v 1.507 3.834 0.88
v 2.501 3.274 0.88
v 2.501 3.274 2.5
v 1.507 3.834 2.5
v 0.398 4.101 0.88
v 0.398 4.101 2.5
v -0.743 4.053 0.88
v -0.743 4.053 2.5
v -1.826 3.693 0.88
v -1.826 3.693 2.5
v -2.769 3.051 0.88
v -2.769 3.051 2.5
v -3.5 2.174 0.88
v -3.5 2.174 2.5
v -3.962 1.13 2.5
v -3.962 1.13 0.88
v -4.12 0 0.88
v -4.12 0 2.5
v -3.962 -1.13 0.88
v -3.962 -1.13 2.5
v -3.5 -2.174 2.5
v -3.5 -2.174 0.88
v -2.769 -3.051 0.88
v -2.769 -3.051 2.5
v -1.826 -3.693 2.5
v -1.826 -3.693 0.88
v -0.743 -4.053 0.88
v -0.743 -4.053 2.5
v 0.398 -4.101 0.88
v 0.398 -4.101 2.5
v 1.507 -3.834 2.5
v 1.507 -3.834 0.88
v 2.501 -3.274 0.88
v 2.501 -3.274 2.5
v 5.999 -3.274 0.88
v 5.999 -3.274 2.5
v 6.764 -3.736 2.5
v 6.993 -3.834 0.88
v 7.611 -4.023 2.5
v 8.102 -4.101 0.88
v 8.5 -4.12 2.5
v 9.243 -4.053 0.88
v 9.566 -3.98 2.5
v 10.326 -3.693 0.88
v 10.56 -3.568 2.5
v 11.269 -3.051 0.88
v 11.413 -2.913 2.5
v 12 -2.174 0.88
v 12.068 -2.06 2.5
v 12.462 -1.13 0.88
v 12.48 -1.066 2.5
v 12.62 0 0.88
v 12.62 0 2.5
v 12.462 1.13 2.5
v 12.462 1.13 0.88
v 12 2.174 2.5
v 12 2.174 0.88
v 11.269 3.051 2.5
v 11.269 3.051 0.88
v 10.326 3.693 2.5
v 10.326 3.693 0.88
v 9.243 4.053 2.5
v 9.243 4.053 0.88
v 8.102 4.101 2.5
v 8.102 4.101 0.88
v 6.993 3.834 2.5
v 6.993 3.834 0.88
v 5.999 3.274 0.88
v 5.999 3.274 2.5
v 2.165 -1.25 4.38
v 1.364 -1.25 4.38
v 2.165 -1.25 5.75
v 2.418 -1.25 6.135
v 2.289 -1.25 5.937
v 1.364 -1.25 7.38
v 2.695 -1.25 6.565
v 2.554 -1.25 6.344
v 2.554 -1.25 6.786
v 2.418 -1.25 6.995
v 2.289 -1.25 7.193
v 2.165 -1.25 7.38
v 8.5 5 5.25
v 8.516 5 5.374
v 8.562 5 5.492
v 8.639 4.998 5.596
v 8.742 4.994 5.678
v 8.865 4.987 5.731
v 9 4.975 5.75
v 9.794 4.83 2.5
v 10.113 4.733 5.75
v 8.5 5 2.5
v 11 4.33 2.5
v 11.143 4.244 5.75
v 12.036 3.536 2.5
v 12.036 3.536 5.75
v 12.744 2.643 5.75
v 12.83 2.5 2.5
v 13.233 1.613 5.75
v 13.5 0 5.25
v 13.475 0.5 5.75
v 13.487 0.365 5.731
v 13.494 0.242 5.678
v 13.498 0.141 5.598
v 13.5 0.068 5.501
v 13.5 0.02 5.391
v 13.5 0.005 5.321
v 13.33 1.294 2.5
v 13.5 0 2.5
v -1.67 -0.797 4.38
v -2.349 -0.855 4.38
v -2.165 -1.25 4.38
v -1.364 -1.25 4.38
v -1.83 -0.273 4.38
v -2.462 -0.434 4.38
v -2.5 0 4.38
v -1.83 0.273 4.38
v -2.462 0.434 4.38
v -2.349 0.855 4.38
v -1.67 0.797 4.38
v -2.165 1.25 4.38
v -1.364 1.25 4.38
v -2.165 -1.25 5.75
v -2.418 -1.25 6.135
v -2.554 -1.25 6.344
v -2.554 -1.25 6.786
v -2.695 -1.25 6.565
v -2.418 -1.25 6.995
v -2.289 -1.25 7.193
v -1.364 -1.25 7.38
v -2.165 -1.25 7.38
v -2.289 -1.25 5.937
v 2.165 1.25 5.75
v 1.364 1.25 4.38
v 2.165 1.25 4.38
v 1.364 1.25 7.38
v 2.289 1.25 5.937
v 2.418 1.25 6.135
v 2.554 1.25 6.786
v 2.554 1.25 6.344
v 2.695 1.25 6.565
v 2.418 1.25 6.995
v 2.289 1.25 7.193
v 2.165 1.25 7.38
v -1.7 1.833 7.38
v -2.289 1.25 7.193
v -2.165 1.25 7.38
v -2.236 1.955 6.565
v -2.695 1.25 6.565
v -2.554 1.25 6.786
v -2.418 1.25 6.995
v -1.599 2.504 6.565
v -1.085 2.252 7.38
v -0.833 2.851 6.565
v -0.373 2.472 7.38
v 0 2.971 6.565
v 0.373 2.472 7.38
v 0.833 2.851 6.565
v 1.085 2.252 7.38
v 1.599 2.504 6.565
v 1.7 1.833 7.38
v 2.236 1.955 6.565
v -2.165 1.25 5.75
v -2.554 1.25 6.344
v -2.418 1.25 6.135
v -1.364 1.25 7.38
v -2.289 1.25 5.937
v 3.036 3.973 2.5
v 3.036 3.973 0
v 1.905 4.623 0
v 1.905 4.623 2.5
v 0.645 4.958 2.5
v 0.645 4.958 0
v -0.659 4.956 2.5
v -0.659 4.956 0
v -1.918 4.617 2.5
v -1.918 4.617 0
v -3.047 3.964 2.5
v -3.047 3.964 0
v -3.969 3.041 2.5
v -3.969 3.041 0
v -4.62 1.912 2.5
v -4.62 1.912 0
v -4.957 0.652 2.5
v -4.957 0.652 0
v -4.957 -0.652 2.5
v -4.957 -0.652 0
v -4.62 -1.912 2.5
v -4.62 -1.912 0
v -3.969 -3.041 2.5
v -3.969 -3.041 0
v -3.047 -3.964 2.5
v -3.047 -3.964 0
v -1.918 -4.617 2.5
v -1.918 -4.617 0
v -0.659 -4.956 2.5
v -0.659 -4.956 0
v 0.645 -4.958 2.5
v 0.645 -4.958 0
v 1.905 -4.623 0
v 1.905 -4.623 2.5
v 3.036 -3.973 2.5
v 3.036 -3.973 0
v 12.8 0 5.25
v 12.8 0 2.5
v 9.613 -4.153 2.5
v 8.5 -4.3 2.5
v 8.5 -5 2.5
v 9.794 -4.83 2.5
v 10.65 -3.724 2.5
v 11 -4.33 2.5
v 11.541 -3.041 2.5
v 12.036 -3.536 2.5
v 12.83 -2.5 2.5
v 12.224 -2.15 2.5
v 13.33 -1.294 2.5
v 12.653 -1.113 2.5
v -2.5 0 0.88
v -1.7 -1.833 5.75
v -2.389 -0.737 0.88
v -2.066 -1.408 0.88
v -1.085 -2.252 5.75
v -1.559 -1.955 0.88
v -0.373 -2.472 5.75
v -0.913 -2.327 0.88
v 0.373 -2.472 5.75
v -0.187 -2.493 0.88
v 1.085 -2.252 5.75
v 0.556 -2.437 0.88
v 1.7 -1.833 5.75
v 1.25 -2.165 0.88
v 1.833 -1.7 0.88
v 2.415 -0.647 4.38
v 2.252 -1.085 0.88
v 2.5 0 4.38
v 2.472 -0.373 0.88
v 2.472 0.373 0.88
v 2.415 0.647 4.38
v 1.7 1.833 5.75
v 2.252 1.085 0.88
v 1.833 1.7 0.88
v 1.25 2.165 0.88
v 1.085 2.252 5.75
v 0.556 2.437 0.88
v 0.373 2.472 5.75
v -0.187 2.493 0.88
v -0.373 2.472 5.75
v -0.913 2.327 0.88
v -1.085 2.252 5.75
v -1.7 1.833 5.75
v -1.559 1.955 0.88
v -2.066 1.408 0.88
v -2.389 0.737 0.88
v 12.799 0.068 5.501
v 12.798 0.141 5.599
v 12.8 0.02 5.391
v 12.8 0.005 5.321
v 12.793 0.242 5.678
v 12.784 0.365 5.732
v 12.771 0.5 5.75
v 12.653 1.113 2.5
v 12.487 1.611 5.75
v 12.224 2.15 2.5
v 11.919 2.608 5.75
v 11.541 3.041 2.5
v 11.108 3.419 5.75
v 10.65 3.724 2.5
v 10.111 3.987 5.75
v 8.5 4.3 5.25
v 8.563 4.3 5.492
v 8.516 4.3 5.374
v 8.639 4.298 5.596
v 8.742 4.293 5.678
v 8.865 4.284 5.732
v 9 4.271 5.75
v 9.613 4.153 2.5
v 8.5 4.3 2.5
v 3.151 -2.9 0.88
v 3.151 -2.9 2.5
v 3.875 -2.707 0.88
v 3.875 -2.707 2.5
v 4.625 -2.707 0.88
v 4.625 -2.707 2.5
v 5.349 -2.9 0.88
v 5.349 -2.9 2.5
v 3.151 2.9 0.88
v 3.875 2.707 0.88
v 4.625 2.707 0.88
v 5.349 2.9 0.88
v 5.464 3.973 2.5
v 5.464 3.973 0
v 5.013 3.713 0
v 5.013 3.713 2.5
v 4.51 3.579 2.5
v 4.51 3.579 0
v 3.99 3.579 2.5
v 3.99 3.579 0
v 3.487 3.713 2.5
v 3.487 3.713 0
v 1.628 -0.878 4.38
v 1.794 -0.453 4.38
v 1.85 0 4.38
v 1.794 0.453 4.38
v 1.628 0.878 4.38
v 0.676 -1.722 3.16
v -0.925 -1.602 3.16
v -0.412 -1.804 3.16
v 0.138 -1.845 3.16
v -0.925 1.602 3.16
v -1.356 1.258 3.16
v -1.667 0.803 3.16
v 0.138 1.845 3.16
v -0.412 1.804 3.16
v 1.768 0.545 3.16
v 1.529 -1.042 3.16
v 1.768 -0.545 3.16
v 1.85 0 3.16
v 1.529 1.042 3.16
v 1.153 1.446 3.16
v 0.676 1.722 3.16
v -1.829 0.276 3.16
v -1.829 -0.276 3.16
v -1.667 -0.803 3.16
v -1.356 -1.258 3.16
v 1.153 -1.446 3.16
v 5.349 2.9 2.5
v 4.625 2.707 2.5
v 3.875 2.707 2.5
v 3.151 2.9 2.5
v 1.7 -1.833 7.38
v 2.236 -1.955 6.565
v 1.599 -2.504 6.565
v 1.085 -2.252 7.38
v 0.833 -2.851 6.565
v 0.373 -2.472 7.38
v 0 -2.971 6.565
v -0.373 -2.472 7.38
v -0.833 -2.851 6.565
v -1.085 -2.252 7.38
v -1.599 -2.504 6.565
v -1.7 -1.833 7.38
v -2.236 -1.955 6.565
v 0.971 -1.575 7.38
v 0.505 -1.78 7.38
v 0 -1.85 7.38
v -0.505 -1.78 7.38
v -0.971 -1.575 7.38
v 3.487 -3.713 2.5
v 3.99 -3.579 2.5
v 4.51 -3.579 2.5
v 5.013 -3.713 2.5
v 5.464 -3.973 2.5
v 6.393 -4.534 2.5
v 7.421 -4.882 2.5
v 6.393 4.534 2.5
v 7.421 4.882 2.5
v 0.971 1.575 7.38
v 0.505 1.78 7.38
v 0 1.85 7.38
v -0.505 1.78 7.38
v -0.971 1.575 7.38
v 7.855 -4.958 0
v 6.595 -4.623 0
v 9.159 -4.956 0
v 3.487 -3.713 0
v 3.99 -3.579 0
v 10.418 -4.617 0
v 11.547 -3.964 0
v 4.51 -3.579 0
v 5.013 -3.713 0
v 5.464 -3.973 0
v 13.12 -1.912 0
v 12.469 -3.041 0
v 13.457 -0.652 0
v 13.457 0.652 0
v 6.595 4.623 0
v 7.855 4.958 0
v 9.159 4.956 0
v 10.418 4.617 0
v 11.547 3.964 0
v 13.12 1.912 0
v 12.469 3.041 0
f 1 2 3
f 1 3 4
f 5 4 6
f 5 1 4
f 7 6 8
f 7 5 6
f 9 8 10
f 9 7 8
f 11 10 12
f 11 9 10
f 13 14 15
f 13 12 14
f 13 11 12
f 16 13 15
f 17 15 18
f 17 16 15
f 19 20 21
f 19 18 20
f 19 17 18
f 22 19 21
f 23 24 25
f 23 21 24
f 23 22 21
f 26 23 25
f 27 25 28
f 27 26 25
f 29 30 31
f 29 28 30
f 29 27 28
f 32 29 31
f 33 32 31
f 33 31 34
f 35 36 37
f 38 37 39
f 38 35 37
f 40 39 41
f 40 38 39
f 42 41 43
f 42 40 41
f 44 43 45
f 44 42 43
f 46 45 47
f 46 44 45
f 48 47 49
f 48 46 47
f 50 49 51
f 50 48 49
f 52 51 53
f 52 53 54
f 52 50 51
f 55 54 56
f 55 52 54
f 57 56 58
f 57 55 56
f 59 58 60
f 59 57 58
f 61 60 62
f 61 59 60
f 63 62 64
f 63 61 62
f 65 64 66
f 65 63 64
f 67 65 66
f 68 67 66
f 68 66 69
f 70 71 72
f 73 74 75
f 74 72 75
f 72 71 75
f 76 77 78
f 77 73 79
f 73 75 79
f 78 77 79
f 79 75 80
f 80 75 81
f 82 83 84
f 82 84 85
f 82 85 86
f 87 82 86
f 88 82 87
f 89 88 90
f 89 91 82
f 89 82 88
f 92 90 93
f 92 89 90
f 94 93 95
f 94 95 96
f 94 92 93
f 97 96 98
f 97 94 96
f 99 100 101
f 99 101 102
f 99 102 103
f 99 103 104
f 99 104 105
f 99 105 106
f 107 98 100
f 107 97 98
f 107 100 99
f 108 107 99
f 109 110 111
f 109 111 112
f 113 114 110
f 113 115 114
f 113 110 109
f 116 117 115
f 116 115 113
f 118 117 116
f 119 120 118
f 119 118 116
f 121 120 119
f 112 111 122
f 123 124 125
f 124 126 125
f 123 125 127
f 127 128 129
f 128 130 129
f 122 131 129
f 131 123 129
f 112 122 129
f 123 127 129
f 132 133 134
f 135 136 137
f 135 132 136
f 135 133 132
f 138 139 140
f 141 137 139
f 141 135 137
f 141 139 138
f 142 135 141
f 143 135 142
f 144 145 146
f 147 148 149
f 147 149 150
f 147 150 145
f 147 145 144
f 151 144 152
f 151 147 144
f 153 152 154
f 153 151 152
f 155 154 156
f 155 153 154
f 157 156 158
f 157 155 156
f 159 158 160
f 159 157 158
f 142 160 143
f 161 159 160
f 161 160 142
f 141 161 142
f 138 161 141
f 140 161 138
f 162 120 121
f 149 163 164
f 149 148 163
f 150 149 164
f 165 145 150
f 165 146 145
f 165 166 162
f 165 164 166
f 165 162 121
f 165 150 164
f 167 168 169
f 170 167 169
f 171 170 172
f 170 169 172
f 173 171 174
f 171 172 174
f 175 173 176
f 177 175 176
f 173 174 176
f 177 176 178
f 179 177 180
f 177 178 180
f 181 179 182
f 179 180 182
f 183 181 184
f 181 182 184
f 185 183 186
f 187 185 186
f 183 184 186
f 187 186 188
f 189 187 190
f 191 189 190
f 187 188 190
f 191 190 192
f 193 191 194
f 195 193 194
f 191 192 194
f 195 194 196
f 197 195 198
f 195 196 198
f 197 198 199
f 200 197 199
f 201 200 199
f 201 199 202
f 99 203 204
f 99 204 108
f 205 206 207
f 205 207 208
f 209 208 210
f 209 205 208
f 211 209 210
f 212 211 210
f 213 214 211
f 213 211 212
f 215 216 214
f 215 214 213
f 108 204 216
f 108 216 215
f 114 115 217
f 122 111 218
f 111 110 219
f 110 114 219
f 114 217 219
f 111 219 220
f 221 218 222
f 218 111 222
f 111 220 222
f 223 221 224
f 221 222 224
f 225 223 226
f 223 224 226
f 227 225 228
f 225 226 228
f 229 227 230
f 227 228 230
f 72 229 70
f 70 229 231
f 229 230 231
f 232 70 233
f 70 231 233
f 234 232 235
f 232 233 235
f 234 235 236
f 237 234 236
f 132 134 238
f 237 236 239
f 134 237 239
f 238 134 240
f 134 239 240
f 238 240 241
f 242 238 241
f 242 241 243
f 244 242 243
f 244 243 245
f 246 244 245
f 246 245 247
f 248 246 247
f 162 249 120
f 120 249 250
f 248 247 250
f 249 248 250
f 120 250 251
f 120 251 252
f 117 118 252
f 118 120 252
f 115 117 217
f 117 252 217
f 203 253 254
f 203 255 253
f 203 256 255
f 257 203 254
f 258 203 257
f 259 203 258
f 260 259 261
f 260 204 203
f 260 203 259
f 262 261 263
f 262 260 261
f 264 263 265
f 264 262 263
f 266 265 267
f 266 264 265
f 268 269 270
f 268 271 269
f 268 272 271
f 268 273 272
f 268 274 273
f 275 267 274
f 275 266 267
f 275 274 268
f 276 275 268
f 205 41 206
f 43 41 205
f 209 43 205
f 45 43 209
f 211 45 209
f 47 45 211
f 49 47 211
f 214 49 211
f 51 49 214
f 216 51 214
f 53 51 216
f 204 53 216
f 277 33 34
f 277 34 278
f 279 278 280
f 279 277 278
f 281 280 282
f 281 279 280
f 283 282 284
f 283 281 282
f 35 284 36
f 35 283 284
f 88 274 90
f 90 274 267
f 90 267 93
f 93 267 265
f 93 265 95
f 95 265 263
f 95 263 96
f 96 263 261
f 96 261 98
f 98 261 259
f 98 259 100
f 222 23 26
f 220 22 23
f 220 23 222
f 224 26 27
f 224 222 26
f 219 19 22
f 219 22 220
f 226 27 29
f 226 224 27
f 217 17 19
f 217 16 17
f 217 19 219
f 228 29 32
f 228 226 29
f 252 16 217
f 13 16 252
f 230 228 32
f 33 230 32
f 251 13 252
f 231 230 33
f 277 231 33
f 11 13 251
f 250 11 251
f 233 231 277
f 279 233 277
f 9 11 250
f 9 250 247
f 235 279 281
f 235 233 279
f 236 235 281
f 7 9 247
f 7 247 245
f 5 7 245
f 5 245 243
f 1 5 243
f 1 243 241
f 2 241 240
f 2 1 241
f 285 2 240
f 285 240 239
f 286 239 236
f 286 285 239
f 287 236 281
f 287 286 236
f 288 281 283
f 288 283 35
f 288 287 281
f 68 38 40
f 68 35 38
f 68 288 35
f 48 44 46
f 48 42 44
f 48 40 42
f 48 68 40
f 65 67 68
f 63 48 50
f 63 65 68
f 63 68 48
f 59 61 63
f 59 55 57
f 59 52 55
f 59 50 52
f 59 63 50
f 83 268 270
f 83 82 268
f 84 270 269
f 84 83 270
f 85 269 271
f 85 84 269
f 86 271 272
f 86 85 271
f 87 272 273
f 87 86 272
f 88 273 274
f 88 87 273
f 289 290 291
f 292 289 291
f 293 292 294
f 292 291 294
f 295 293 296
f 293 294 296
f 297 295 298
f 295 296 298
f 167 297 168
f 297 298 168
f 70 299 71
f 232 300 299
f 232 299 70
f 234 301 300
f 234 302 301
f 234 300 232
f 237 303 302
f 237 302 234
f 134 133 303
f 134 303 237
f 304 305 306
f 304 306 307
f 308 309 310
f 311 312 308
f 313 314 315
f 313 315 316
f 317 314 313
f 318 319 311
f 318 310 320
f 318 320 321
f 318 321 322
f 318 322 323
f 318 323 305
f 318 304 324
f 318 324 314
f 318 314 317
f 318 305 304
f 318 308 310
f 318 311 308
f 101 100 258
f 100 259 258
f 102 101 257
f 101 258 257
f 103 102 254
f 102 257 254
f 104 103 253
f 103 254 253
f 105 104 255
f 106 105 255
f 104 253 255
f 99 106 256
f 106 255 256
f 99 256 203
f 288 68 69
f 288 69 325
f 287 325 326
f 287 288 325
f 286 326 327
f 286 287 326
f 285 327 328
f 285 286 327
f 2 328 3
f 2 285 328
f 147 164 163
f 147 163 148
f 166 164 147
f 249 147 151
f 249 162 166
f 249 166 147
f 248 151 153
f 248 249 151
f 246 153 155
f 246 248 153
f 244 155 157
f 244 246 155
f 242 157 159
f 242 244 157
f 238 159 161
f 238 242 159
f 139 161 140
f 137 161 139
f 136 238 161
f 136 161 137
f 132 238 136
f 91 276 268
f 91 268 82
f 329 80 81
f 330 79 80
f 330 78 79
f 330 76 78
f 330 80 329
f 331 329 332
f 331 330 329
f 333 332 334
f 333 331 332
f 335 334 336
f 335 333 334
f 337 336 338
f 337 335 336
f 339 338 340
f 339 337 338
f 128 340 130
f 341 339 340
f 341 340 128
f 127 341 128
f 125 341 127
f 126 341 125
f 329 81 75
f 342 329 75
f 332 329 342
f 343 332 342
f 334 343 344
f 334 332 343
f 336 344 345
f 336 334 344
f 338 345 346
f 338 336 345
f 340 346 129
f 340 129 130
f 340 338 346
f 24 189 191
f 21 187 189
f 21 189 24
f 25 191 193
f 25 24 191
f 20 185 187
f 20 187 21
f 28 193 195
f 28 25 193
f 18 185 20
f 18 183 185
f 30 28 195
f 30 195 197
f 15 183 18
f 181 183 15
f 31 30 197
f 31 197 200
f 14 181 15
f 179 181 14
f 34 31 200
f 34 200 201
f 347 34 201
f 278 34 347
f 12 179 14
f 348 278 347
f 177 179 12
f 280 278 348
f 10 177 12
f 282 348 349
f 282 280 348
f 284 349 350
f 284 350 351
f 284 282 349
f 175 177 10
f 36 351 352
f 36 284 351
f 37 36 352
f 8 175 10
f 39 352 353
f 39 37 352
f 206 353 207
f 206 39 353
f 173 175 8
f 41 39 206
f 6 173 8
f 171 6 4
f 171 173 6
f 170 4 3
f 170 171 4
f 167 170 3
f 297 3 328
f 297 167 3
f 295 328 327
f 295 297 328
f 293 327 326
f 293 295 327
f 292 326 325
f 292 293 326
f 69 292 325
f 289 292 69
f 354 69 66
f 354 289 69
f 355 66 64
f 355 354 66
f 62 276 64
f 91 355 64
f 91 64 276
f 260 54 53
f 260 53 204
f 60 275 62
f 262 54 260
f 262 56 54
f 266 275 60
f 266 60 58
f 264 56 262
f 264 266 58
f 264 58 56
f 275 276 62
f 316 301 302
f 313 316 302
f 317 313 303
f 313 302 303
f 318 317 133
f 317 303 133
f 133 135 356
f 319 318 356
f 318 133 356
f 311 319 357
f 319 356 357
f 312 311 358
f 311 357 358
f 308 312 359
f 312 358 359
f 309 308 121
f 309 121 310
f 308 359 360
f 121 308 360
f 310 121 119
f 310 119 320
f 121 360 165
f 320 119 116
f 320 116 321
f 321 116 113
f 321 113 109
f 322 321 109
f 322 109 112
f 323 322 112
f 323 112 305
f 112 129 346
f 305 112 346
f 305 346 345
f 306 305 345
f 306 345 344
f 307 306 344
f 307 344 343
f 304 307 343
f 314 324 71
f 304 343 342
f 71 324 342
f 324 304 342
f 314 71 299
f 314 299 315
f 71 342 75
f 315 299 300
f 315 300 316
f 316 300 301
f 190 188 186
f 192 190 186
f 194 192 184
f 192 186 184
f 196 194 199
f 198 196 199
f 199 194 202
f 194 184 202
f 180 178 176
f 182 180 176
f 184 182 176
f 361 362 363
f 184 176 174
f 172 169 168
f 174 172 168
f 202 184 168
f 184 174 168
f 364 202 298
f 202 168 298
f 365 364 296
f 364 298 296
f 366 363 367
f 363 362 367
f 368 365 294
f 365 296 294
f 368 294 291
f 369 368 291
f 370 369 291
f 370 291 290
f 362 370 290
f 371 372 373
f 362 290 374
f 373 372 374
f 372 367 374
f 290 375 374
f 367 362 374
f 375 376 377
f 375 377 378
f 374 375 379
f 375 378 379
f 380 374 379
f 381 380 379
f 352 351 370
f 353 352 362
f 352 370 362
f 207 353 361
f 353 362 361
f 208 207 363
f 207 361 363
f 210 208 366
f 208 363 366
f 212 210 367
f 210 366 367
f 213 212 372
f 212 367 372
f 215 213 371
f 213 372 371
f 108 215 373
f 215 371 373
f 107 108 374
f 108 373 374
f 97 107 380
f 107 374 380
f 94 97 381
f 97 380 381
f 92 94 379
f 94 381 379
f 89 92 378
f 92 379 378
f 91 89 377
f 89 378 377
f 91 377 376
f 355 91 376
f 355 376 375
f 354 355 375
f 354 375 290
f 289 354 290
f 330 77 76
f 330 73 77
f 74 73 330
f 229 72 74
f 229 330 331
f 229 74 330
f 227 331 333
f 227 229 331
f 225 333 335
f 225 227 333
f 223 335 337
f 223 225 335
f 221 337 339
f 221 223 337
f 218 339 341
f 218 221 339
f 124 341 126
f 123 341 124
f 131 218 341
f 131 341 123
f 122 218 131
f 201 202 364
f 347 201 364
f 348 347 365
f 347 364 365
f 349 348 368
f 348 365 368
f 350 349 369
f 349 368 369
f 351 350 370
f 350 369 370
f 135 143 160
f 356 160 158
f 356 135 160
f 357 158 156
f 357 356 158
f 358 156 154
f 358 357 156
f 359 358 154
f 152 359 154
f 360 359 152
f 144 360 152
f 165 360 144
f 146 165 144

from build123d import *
from build123d.topology import SkipClean

# Parameters (mm, degrees)
BOSS_EXTRUDE1_DEPTH = 2.5
SHELL1_T            = -0.88
BOSS_EXTRUDE2_DEPTH = 3.25
FILLET1_R           = 0.5
FILLET2_R           = 0.5
SKETCH3_R           = 2.5
BOSS_EXTRUDE3_DEPTH = 6.5
SKETCH5_R           = 1.85
CUT_EXTRUDE1_DEPTH  = 4.22
SKETCH8_W           = 6.47168307
SKETCH8_H           = 2.5
CUT_EXTRUDE2_DEPTH  = 3
SKETCH9_W           = 5
SKETCH9_H           = 5
CUT_EXTRUDE3_DEPTH  = 3.25


# Read off the part's stored shape, not the designer's step: Mirror1
with BuildPart() as part:
    # Sketch1 → Boss-Extrude1 (new body)
    with BuildSketch(Plane.XY):
        with BuildLine():
            ThreePointArc((3.035714286, 3.972963475), (-5, 0), (3.035714286, -3.972963475))
            ThreePointArc((3.035714286, -3.972963475), (4.25, -3.562148865), (5.464285714, -3.972963475))
            ThreePointArc((5.464285714, -3.972963475), (13.5, 0), (5.464285714, 3.972963475))
            ThreePointArc((5.464285714, 3.972963475), (4.25, 3.562148865), (3.035714286, 3.972963475))
        make_face()
    extrude(amount=BOSS_EXTRUDE1_DEPTH)

    # Shell1
    shell1_openings = [part.faces().sort_by_distance(p)[0] for p in [
        (4.25, 0, 2.5),
    ]]
    offset(amount=SHELL1_T, openings=shell1_openings, kind=Kind.INTERSECTION)

    # Sketch2 → Boss-Extrude2 (add)
    with BuildSketch(Plane.XY.offset(2.5)):
        with BuildLine():
            Line((13.5, 0), (12.8, 0))
            ThreePointArc((12.8, 0), (11.540559159, -3.040559159), (8.5, -4.3))
            Line((8.5, -4.3), (8.5, -5))
            ThreePointArc((8.5, -5), (12.035533906, -3.535533906), (13.5, 0))
        make_face()
    extrude(amount=BOSS_EXTRUDE2_DEPTH)

    # Fillet1
    fillet1_edges = [part.edges().sort_by_distance(p)[0] for p in [
        (8.5, -4.65, 5.75),
    ]]
    fillet(fillet1_edges, radius=FILLET1_R)

    # Fillet2
    fillet2_edges = [part.edges().sort_by_distance(p)[0] for p in [
        (13.15, 0, 5.75),
    ]]
    fillet(fillet2_edges, radius=FILLET2_R)

    # Sketch3 → Boss-Extrude3 (add)
    with BuildSketch(Plane.XY.offset(0.88)):
        with Locations(Location((0, 0, 0), (0, 0, 180))):
            Circle(SKETCH3_R)
    extrude(amount=BOSS_EXTRUDE3_DEPTH)

    # Sketch5 → Cut-Extrude1 (cut)
    with BuildSketch(Plane.XY.offset(7.38)):
        Circle(SKETCH5_R)
    extrude(amount=-CUT_EXTRUDE1_DEPTH, mode=Mode.SUBTRACT)

    # Sketch6 → Revolve1 (revolve)
    with BuildSketch(Plane(origin=(0, 0, 0), x_dir=(1, 0, 0), z_dir=(0, 1, 0))):
        Polygon((2.5, -5.75), (2.5, -7.38), (2.970540469, -6.565), align=None)
    revolve(axis=Axis((0, 0, 7.38), (0, 0, -1)))

    # Sketch8 → Cut-Extrude2 (cut)
    with BuildSketch(Plane.XY.offset(7.38)):
        Rectangle(SKETCH8_W, SKETCH8_H)
    extrude(amount=-CUT_EXTRUDE2_DEPTH, mode=Mode.SUBTRACT)

    # Mirror1: part across plane


with BuildPart() as part_1:
    with SkipClean():  # the faces are left unmerged after this step: merging them gives an invalid solid
        add(part.part)
        add(part.part.mirror(Plane.ZX))

    # Sketch9 → Cut-Extrude3 (cut)
    with SkipClean():  # the faces are left unmerged after this step: merging them gives an invalid solid
        with BuildSketch(Plane.XY.offset(5.75)):
            with Locations((11, -2.5)):
                Rectangle(SKETCH9_W, SKETCH9_H)
        extrude(amount=-CUT_EXTRUDE3_DEPTH, mode=Mode.SUBTRACT)


solid = part_1.part
